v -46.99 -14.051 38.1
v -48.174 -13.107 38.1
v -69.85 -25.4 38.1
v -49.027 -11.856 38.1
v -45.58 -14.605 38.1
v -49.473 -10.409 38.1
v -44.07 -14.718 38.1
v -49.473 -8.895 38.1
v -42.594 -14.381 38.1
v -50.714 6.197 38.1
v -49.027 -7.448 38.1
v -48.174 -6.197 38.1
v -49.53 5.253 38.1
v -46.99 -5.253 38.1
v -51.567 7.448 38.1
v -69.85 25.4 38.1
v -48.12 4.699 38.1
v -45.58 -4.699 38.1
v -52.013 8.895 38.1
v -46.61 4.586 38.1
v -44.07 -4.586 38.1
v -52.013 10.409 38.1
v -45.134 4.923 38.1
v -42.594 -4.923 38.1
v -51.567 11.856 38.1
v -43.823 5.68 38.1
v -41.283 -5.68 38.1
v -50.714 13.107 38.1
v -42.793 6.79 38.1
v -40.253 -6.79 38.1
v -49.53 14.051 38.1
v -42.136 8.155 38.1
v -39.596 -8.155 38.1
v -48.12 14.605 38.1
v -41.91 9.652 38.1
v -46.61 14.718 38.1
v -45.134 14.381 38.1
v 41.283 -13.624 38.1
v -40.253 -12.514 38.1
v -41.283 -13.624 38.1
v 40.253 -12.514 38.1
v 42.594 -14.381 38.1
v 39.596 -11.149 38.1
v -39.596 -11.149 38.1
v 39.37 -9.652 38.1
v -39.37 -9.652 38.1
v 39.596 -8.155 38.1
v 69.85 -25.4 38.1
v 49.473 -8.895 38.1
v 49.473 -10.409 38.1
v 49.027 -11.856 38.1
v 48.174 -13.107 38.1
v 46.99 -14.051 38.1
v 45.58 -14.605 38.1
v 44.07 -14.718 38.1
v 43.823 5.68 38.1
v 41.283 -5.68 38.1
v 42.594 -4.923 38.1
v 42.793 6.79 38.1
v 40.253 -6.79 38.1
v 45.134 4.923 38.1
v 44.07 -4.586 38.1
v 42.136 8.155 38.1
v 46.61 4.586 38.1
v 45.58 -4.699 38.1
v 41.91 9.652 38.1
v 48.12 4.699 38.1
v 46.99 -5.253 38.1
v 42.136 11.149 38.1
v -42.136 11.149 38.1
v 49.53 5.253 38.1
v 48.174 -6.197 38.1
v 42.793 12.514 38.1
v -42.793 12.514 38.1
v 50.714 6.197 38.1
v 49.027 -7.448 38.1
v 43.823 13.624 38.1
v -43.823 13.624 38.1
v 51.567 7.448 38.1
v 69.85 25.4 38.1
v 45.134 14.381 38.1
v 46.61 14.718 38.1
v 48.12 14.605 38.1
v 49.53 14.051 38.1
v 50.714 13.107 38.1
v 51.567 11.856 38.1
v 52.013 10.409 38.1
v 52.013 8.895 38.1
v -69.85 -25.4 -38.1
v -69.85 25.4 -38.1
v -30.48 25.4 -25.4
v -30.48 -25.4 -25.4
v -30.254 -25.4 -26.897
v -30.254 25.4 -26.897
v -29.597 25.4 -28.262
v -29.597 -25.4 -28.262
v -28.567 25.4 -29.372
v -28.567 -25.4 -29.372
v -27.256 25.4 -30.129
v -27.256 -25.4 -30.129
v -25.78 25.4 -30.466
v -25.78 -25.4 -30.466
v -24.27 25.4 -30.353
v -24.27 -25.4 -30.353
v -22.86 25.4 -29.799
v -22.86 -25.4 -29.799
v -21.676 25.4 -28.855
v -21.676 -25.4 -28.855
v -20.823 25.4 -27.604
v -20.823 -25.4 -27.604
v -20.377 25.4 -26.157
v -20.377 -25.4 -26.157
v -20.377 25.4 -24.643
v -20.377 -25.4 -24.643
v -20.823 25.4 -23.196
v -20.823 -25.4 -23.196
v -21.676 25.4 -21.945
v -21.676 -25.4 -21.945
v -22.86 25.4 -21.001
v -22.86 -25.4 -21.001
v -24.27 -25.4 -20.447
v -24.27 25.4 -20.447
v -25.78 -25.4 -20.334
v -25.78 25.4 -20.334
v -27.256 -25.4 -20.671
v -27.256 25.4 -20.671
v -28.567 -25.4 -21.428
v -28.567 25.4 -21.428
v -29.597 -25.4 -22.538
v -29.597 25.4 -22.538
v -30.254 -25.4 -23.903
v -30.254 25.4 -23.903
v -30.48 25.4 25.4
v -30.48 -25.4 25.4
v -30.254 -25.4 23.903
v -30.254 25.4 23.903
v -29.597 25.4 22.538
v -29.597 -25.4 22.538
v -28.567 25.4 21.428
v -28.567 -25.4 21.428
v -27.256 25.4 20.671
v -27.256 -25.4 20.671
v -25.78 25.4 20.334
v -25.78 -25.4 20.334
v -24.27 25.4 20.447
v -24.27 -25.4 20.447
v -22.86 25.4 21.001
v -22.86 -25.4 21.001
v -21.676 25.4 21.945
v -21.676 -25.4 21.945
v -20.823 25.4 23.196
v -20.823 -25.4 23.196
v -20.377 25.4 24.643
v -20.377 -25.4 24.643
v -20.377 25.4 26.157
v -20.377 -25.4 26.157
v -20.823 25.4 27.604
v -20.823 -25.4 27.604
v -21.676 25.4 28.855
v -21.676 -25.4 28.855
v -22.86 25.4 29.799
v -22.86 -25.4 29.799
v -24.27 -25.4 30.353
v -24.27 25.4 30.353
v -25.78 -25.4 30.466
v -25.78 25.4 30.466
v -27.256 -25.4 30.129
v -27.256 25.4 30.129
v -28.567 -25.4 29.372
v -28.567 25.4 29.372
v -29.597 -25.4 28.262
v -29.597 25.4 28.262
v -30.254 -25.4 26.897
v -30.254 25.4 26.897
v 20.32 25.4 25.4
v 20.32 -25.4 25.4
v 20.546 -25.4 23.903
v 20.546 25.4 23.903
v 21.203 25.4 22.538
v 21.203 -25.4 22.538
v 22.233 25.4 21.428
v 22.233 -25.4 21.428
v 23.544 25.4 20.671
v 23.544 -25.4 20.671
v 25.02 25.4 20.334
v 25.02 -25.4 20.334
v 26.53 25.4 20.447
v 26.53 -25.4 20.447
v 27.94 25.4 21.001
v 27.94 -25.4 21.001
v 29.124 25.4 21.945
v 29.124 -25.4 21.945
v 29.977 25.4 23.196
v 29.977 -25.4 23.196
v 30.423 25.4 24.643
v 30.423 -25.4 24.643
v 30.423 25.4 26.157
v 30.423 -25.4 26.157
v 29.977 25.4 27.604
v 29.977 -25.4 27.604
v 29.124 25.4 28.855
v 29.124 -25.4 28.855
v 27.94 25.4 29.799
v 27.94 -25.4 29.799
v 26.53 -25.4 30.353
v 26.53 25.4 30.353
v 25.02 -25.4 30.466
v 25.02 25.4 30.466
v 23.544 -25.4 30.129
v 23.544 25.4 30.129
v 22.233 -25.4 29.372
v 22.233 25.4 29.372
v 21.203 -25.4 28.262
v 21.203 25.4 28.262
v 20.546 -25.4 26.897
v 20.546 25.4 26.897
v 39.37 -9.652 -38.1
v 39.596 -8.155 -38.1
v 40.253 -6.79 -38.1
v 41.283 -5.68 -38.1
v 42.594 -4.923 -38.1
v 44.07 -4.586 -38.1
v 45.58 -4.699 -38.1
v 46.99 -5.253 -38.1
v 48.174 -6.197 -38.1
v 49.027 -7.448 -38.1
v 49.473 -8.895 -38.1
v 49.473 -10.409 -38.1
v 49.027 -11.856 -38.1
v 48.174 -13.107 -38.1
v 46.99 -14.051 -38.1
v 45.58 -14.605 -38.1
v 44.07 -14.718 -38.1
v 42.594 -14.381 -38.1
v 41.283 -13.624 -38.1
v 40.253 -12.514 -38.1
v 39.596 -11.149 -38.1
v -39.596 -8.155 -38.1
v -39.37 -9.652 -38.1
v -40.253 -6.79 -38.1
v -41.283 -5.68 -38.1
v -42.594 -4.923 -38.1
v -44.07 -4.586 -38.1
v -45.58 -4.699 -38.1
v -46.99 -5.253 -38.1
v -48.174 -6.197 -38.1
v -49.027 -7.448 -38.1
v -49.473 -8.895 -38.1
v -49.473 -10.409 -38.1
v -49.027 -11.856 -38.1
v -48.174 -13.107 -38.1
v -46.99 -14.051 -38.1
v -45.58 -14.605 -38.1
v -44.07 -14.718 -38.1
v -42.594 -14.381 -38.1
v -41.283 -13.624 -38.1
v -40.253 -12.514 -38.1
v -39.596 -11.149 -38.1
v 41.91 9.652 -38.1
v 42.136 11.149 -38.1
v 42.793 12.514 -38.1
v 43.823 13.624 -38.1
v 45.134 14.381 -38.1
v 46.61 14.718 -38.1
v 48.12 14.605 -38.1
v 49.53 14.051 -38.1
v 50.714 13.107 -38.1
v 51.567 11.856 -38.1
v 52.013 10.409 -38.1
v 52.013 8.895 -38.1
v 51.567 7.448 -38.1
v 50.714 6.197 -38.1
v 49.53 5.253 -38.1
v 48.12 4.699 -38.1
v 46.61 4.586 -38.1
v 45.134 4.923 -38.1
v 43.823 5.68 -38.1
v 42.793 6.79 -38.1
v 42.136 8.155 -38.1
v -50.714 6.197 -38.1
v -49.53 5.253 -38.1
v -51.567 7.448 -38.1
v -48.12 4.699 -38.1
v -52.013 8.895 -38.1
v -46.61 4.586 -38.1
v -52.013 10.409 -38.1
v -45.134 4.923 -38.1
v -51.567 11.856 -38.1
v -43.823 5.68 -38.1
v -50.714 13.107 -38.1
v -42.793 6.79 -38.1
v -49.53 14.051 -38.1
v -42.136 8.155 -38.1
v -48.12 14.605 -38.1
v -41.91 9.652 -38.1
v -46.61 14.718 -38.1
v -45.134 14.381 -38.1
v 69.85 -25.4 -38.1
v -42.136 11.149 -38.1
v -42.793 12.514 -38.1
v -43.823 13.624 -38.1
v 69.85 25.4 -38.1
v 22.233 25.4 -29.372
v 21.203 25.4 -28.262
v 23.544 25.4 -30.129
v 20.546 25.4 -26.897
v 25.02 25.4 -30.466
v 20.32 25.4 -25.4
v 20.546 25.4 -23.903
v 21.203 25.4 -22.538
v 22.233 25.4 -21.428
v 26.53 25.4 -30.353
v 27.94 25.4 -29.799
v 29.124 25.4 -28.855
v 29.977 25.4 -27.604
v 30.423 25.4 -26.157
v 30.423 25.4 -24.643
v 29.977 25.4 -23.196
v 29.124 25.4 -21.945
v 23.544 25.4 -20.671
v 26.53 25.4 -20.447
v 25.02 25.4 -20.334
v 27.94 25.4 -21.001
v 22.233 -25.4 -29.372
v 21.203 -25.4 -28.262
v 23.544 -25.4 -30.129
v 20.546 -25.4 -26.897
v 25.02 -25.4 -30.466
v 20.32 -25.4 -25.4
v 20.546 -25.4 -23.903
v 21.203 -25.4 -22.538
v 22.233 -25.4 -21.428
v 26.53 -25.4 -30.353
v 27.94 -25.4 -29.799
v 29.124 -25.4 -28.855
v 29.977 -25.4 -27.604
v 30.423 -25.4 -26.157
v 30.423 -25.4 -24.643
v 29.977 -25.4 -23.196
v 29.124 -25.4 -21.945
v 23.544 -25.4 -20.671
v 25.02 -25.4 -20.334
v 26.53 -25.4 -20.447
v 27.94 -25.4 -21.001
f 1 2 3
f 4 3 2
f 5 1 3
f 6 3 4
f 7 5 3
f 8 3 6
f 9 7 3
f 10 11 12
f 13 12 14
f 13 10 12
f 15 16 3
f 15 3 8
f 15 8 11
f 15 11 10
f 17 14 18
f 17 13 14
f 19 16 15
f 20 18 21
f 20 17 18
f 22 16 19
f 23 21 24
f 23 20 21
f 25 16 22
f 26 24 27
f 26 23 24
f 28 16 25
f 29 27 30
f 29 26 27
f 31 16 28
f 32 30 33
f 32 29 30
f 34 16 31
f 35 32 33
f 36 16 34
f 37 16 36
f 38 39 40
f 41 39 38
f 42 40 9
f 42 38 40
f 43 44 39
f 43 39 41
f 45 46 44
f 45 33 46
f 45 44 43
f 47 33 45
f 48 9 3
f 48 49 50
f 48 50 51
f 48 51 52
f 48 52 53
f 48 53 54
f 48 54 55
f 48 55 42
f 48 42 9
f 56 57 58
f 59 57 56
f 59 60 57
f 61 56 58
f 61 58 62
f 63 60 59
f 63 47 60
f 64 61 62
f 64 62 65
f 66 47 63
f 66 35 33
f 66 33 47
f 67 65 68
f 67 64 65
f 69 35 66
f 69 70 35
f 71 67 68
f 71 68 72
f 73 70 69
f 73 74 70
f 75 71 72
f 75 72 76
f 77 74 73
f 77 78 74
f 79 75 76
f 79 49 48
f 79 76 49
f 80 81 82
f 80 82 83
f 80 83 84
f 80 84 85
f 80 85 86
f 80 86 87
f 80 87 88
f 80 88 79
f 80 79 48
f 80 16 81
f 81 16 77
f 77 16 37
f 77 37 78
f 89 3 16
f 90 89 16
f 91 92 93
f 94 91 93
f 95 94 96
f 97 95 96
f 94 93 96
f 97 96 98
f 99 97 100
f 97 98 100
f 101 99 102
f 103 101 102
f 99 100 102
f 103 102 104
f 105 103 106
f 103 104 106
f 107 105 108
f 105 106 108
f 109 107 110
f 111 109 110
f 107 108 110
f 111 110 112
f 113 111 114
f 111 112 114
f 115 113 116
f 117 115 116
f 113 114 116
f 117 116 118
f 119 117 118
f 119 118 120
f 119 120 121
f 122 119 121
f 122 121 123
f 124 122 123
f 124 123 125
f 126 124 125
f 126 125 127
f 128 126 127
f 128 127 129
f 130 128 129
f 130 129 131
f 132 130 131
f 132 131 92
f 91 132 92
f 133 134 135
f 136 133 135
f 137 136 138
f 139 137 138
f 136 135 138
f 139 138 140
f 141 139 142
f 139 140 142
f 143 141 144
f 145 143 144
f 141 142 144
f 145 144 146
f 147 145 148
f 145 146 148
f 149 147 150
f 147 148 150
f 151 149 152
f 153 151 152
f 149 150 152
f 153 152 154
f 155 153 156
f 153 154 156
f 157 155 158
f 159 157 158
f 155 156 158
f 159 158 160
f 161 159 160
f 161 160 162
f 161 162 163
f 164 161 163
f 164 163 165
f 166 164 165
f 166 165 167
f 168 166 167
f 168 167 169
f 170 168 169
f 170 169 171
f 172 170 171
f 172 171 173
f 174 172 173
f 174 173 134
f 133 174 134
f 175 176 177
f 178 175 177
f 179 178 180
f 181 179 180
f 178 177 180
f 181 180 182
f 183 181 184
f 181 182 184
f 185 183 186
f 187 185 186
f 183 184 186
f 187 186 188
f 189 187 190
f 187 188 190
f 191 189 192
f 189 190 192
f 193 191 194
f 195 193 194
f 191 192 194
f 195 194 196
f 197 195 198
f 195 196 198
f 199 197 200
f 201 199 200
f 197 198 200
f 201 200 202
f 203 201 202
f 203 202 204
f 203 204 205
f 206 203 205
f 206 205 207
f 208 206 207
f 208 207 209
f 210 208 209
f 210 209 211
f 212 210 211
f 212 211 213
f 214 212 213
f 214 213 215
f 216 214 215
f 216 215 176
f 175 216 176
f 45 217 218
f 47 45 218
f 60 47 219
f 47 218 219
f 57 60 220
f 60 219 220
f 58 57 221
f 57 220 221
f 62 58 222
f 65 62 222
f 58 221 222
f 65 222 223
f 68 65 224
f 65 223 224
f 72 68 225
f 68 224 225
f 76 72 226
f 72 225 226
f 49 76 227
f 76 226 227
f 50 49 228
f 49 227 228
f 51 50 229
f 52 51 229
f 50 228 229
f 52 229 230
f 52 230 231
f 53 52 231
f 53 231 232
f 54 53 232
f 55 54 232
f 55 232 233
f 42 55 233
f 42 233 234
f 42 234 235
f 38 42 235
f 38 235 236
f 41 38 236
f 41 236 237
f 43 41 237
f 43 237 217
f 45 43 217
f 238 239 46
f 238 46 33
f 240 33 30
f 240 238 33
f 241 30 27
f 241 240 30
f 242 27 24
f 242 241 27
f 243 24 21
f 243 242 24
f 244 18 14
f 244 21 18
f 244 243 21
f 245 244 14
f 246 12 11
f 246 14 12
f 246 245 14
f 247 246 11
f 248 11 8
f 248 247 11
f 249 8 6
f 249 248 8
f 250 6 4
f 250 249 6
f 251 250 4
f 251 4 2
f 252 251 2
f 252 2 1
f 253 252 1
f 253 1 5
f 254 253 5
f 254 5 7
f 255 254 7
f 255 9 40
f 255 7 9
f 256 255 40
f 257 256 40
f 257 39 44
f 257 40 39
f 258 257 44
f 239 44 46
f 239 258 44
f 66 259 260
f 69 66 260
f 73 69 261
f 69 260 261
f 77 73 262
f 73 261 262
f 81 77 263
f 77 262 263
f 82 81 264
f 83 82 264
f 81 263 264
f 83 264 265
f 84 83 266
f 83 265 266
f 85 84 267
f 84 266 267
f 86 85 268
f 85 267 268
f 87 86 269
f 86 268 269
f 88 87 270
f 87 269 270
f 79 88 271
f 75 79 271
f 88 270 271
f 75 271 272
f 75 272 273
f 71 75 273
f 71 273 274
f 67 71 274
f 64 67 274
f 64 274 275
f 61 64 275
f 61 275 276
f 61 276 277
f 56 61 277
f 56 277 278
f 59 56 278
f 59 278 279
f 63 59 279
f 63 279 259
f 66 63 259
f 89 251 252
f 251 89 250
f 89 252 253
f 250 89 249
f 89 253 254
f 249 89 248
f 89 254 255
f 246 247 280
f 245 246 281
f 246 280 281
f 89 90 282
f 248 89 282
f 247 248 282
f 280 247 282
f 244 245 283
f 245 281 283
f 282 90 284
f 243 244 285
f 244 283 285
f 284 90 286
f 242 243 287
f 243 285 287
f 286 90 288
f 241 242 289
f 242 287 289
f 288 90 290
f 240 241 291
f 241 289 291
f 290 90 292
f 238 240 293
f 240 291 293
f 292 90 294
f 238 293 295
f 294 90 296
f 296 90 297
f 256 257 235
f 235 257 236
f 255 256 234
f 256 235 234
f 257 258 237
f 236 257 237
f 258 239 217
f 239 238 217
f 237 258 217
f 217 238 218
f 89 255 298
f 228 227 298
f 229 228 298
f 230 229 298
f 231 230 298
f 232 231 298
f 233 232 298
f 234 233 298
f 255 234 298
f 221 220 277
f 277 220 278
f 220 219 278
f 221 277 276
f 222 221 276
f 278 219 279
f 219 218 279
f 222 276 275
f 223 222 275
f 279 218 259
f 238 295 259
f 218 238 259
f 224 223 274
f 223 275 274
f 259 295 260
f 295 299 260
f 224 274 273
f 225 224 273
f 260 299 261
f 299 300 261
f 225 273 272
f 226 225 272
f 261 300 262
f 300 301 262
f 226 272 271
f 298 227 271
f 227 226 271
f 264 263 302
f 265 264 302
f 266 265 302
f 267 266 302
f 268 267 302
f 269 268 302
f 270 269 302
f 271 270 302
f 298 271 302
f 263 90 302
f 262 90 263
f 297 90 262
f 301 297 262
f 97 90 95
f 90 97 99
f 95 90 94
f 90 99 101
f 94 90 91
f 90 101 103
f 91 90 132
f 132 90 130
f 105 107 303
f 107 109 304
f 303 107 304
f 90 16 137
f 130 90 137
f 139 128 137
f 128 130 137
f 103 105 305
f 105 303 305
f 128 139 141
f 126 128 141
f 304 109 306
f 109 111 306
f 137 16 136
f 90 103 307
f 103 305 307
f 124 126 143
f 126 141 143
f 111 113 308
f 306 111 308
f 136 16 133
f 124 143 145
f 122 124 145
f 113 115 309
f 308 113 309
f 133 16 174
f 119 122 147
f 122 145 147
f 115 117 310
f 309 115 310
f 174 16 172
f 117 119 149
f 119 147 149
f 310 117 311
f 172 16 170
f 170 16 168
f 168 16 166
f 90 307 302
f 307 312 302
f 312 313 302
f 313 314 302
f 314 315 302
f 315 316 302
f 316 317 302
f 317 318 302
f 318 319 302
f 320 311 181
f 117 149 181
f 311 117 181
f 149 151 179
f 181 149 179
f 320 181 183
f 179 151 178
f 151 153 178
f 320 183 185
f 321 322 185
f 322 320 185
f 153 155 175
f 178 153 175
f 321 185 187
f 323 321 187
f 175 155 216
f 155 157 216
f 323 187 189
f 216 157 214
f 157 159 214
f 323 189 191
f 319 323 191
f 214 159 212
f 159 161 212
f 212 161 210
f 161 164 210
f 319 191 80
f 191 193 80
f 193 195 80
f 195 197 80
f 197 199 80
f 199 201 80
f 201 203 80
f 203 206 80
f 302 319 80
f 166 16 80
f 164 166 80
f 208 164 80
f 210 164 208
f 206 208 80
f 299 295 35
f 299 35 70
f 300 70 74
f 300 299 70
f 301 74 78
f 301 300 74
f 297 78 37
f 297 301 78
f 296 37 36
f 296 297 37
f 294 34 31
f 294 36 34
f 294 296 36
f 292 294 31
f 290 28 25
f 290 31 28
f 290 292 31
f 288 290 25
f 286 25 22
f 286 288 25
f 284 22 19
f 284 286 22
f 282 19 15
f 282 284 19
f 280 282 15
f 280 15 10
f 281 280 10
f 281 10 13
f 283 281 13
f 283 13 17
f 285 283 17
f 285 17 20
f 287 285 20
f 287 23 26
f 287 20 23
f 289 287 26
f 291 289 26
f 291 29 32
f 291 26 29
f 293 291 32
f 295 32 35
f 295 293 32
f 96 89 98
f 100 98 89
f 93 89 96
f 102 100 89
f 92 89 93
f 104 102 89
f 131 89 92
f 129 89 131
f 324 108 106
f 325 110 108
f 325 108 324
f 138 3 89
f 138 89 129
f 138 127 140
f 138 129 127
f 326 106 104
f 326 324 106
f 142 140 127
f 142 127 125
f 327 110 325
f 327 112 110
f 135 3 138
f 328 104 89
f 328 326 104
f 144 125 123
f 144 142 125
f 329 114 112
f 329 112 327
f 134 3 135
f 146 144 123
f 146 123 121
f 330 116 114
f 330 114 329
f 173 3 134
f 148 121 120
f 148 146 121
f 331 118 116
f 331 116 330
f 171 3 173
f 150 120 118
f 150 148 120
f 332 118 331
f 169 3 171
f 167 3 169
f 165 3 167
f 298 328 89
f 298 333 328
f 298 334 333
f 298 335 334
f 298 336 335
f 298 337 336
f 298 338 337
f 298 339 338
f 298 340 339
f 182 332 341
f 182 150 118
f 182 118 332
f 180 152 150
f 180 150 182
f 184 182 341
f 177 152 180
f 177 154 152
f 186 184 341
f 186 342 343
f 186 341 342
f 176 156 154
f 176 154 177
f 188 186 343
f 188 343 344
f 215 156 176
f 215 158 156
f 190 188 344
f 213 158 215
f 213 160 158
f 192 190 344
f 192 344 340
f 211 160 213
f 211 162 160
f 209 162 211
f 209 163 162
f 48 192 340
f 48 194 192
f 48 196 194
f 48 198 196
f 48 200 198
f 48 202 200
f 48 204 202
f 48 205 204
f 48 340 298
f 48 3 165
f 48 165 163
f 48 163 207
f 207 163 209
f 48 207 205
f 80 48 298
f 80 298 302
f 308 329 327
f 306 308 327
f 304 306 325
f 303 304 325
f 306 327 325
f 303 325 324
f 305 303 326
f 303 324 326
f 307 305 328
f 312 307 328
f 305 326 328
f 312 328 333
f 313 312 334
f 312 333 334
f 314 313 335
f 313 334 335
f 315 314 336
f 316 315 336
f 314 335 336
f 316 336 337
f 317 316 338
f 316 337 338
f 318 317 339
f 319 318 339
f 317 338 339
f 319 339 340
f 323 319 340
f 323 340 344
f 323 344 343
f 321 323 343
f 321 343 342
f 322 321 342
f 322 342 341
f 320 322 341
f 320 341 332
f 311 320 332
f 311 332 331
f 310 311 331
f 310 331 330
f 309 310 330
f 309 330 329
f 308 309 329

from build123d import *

# Parameters (mm, degrees)
SKETCH1_W                     = 139.7
SKETCH1_H                     = 50.8
BOSS_EXTRUDE1_DEPTH           = 38.1
F_0_4IN_DIAMETER_HOLE_ZAXIS_D = 10.16
F_0_4IN_DIAMETER_HOLE_YAXIS_D = 10.16


with BuildPart() as part:
    # Sketch1 → Boss-Extrude1 (new, symmetric)
    with BuildSketch(Plane.XY):
        Rectangle(SKETCH1_W, SKETCH1_H)
    extrude(amount=BOSS_EXTRUDE1_DEPTH, both=True)

    # 0.4in Diameter Hole zaxis (through all)
    with Locations(Plane.XY.offset(38.1)):
        with Locations((46.99, 9.652), (44.45, -9.652)):
            f_0_4in_diameter_hole_zaxis = Hole(F_0_4IN_DIAMETER_HOLE_ZAXIS_D / 2)

    # Mirror1: 0.4in Diameter Hole zaxis across plane
    add(f_0_4in_diameter_hole_zaxis.mirror(Plane(origin=(0, 0, 0), x_dir=(0, 0, 1), z_dir=(1, 0, 0))), mode=Mode.SUBTRACT)

    # 0.4in Diameter Hole yaxis (through all)
    with Locations(Plane(origin=(0, 25.4, 0), x_dir=(1, 0, 0), z_dir=(0, 1, 0))):
        with Locations((-25.4, 25.4), (-25.4, -25.4), (25.4, -25.4), (25.4, 25.4)):
            Hole(F_0_4IN_DIAMETER_HOLE_YAXIS_D / 2)


solid = part.part
